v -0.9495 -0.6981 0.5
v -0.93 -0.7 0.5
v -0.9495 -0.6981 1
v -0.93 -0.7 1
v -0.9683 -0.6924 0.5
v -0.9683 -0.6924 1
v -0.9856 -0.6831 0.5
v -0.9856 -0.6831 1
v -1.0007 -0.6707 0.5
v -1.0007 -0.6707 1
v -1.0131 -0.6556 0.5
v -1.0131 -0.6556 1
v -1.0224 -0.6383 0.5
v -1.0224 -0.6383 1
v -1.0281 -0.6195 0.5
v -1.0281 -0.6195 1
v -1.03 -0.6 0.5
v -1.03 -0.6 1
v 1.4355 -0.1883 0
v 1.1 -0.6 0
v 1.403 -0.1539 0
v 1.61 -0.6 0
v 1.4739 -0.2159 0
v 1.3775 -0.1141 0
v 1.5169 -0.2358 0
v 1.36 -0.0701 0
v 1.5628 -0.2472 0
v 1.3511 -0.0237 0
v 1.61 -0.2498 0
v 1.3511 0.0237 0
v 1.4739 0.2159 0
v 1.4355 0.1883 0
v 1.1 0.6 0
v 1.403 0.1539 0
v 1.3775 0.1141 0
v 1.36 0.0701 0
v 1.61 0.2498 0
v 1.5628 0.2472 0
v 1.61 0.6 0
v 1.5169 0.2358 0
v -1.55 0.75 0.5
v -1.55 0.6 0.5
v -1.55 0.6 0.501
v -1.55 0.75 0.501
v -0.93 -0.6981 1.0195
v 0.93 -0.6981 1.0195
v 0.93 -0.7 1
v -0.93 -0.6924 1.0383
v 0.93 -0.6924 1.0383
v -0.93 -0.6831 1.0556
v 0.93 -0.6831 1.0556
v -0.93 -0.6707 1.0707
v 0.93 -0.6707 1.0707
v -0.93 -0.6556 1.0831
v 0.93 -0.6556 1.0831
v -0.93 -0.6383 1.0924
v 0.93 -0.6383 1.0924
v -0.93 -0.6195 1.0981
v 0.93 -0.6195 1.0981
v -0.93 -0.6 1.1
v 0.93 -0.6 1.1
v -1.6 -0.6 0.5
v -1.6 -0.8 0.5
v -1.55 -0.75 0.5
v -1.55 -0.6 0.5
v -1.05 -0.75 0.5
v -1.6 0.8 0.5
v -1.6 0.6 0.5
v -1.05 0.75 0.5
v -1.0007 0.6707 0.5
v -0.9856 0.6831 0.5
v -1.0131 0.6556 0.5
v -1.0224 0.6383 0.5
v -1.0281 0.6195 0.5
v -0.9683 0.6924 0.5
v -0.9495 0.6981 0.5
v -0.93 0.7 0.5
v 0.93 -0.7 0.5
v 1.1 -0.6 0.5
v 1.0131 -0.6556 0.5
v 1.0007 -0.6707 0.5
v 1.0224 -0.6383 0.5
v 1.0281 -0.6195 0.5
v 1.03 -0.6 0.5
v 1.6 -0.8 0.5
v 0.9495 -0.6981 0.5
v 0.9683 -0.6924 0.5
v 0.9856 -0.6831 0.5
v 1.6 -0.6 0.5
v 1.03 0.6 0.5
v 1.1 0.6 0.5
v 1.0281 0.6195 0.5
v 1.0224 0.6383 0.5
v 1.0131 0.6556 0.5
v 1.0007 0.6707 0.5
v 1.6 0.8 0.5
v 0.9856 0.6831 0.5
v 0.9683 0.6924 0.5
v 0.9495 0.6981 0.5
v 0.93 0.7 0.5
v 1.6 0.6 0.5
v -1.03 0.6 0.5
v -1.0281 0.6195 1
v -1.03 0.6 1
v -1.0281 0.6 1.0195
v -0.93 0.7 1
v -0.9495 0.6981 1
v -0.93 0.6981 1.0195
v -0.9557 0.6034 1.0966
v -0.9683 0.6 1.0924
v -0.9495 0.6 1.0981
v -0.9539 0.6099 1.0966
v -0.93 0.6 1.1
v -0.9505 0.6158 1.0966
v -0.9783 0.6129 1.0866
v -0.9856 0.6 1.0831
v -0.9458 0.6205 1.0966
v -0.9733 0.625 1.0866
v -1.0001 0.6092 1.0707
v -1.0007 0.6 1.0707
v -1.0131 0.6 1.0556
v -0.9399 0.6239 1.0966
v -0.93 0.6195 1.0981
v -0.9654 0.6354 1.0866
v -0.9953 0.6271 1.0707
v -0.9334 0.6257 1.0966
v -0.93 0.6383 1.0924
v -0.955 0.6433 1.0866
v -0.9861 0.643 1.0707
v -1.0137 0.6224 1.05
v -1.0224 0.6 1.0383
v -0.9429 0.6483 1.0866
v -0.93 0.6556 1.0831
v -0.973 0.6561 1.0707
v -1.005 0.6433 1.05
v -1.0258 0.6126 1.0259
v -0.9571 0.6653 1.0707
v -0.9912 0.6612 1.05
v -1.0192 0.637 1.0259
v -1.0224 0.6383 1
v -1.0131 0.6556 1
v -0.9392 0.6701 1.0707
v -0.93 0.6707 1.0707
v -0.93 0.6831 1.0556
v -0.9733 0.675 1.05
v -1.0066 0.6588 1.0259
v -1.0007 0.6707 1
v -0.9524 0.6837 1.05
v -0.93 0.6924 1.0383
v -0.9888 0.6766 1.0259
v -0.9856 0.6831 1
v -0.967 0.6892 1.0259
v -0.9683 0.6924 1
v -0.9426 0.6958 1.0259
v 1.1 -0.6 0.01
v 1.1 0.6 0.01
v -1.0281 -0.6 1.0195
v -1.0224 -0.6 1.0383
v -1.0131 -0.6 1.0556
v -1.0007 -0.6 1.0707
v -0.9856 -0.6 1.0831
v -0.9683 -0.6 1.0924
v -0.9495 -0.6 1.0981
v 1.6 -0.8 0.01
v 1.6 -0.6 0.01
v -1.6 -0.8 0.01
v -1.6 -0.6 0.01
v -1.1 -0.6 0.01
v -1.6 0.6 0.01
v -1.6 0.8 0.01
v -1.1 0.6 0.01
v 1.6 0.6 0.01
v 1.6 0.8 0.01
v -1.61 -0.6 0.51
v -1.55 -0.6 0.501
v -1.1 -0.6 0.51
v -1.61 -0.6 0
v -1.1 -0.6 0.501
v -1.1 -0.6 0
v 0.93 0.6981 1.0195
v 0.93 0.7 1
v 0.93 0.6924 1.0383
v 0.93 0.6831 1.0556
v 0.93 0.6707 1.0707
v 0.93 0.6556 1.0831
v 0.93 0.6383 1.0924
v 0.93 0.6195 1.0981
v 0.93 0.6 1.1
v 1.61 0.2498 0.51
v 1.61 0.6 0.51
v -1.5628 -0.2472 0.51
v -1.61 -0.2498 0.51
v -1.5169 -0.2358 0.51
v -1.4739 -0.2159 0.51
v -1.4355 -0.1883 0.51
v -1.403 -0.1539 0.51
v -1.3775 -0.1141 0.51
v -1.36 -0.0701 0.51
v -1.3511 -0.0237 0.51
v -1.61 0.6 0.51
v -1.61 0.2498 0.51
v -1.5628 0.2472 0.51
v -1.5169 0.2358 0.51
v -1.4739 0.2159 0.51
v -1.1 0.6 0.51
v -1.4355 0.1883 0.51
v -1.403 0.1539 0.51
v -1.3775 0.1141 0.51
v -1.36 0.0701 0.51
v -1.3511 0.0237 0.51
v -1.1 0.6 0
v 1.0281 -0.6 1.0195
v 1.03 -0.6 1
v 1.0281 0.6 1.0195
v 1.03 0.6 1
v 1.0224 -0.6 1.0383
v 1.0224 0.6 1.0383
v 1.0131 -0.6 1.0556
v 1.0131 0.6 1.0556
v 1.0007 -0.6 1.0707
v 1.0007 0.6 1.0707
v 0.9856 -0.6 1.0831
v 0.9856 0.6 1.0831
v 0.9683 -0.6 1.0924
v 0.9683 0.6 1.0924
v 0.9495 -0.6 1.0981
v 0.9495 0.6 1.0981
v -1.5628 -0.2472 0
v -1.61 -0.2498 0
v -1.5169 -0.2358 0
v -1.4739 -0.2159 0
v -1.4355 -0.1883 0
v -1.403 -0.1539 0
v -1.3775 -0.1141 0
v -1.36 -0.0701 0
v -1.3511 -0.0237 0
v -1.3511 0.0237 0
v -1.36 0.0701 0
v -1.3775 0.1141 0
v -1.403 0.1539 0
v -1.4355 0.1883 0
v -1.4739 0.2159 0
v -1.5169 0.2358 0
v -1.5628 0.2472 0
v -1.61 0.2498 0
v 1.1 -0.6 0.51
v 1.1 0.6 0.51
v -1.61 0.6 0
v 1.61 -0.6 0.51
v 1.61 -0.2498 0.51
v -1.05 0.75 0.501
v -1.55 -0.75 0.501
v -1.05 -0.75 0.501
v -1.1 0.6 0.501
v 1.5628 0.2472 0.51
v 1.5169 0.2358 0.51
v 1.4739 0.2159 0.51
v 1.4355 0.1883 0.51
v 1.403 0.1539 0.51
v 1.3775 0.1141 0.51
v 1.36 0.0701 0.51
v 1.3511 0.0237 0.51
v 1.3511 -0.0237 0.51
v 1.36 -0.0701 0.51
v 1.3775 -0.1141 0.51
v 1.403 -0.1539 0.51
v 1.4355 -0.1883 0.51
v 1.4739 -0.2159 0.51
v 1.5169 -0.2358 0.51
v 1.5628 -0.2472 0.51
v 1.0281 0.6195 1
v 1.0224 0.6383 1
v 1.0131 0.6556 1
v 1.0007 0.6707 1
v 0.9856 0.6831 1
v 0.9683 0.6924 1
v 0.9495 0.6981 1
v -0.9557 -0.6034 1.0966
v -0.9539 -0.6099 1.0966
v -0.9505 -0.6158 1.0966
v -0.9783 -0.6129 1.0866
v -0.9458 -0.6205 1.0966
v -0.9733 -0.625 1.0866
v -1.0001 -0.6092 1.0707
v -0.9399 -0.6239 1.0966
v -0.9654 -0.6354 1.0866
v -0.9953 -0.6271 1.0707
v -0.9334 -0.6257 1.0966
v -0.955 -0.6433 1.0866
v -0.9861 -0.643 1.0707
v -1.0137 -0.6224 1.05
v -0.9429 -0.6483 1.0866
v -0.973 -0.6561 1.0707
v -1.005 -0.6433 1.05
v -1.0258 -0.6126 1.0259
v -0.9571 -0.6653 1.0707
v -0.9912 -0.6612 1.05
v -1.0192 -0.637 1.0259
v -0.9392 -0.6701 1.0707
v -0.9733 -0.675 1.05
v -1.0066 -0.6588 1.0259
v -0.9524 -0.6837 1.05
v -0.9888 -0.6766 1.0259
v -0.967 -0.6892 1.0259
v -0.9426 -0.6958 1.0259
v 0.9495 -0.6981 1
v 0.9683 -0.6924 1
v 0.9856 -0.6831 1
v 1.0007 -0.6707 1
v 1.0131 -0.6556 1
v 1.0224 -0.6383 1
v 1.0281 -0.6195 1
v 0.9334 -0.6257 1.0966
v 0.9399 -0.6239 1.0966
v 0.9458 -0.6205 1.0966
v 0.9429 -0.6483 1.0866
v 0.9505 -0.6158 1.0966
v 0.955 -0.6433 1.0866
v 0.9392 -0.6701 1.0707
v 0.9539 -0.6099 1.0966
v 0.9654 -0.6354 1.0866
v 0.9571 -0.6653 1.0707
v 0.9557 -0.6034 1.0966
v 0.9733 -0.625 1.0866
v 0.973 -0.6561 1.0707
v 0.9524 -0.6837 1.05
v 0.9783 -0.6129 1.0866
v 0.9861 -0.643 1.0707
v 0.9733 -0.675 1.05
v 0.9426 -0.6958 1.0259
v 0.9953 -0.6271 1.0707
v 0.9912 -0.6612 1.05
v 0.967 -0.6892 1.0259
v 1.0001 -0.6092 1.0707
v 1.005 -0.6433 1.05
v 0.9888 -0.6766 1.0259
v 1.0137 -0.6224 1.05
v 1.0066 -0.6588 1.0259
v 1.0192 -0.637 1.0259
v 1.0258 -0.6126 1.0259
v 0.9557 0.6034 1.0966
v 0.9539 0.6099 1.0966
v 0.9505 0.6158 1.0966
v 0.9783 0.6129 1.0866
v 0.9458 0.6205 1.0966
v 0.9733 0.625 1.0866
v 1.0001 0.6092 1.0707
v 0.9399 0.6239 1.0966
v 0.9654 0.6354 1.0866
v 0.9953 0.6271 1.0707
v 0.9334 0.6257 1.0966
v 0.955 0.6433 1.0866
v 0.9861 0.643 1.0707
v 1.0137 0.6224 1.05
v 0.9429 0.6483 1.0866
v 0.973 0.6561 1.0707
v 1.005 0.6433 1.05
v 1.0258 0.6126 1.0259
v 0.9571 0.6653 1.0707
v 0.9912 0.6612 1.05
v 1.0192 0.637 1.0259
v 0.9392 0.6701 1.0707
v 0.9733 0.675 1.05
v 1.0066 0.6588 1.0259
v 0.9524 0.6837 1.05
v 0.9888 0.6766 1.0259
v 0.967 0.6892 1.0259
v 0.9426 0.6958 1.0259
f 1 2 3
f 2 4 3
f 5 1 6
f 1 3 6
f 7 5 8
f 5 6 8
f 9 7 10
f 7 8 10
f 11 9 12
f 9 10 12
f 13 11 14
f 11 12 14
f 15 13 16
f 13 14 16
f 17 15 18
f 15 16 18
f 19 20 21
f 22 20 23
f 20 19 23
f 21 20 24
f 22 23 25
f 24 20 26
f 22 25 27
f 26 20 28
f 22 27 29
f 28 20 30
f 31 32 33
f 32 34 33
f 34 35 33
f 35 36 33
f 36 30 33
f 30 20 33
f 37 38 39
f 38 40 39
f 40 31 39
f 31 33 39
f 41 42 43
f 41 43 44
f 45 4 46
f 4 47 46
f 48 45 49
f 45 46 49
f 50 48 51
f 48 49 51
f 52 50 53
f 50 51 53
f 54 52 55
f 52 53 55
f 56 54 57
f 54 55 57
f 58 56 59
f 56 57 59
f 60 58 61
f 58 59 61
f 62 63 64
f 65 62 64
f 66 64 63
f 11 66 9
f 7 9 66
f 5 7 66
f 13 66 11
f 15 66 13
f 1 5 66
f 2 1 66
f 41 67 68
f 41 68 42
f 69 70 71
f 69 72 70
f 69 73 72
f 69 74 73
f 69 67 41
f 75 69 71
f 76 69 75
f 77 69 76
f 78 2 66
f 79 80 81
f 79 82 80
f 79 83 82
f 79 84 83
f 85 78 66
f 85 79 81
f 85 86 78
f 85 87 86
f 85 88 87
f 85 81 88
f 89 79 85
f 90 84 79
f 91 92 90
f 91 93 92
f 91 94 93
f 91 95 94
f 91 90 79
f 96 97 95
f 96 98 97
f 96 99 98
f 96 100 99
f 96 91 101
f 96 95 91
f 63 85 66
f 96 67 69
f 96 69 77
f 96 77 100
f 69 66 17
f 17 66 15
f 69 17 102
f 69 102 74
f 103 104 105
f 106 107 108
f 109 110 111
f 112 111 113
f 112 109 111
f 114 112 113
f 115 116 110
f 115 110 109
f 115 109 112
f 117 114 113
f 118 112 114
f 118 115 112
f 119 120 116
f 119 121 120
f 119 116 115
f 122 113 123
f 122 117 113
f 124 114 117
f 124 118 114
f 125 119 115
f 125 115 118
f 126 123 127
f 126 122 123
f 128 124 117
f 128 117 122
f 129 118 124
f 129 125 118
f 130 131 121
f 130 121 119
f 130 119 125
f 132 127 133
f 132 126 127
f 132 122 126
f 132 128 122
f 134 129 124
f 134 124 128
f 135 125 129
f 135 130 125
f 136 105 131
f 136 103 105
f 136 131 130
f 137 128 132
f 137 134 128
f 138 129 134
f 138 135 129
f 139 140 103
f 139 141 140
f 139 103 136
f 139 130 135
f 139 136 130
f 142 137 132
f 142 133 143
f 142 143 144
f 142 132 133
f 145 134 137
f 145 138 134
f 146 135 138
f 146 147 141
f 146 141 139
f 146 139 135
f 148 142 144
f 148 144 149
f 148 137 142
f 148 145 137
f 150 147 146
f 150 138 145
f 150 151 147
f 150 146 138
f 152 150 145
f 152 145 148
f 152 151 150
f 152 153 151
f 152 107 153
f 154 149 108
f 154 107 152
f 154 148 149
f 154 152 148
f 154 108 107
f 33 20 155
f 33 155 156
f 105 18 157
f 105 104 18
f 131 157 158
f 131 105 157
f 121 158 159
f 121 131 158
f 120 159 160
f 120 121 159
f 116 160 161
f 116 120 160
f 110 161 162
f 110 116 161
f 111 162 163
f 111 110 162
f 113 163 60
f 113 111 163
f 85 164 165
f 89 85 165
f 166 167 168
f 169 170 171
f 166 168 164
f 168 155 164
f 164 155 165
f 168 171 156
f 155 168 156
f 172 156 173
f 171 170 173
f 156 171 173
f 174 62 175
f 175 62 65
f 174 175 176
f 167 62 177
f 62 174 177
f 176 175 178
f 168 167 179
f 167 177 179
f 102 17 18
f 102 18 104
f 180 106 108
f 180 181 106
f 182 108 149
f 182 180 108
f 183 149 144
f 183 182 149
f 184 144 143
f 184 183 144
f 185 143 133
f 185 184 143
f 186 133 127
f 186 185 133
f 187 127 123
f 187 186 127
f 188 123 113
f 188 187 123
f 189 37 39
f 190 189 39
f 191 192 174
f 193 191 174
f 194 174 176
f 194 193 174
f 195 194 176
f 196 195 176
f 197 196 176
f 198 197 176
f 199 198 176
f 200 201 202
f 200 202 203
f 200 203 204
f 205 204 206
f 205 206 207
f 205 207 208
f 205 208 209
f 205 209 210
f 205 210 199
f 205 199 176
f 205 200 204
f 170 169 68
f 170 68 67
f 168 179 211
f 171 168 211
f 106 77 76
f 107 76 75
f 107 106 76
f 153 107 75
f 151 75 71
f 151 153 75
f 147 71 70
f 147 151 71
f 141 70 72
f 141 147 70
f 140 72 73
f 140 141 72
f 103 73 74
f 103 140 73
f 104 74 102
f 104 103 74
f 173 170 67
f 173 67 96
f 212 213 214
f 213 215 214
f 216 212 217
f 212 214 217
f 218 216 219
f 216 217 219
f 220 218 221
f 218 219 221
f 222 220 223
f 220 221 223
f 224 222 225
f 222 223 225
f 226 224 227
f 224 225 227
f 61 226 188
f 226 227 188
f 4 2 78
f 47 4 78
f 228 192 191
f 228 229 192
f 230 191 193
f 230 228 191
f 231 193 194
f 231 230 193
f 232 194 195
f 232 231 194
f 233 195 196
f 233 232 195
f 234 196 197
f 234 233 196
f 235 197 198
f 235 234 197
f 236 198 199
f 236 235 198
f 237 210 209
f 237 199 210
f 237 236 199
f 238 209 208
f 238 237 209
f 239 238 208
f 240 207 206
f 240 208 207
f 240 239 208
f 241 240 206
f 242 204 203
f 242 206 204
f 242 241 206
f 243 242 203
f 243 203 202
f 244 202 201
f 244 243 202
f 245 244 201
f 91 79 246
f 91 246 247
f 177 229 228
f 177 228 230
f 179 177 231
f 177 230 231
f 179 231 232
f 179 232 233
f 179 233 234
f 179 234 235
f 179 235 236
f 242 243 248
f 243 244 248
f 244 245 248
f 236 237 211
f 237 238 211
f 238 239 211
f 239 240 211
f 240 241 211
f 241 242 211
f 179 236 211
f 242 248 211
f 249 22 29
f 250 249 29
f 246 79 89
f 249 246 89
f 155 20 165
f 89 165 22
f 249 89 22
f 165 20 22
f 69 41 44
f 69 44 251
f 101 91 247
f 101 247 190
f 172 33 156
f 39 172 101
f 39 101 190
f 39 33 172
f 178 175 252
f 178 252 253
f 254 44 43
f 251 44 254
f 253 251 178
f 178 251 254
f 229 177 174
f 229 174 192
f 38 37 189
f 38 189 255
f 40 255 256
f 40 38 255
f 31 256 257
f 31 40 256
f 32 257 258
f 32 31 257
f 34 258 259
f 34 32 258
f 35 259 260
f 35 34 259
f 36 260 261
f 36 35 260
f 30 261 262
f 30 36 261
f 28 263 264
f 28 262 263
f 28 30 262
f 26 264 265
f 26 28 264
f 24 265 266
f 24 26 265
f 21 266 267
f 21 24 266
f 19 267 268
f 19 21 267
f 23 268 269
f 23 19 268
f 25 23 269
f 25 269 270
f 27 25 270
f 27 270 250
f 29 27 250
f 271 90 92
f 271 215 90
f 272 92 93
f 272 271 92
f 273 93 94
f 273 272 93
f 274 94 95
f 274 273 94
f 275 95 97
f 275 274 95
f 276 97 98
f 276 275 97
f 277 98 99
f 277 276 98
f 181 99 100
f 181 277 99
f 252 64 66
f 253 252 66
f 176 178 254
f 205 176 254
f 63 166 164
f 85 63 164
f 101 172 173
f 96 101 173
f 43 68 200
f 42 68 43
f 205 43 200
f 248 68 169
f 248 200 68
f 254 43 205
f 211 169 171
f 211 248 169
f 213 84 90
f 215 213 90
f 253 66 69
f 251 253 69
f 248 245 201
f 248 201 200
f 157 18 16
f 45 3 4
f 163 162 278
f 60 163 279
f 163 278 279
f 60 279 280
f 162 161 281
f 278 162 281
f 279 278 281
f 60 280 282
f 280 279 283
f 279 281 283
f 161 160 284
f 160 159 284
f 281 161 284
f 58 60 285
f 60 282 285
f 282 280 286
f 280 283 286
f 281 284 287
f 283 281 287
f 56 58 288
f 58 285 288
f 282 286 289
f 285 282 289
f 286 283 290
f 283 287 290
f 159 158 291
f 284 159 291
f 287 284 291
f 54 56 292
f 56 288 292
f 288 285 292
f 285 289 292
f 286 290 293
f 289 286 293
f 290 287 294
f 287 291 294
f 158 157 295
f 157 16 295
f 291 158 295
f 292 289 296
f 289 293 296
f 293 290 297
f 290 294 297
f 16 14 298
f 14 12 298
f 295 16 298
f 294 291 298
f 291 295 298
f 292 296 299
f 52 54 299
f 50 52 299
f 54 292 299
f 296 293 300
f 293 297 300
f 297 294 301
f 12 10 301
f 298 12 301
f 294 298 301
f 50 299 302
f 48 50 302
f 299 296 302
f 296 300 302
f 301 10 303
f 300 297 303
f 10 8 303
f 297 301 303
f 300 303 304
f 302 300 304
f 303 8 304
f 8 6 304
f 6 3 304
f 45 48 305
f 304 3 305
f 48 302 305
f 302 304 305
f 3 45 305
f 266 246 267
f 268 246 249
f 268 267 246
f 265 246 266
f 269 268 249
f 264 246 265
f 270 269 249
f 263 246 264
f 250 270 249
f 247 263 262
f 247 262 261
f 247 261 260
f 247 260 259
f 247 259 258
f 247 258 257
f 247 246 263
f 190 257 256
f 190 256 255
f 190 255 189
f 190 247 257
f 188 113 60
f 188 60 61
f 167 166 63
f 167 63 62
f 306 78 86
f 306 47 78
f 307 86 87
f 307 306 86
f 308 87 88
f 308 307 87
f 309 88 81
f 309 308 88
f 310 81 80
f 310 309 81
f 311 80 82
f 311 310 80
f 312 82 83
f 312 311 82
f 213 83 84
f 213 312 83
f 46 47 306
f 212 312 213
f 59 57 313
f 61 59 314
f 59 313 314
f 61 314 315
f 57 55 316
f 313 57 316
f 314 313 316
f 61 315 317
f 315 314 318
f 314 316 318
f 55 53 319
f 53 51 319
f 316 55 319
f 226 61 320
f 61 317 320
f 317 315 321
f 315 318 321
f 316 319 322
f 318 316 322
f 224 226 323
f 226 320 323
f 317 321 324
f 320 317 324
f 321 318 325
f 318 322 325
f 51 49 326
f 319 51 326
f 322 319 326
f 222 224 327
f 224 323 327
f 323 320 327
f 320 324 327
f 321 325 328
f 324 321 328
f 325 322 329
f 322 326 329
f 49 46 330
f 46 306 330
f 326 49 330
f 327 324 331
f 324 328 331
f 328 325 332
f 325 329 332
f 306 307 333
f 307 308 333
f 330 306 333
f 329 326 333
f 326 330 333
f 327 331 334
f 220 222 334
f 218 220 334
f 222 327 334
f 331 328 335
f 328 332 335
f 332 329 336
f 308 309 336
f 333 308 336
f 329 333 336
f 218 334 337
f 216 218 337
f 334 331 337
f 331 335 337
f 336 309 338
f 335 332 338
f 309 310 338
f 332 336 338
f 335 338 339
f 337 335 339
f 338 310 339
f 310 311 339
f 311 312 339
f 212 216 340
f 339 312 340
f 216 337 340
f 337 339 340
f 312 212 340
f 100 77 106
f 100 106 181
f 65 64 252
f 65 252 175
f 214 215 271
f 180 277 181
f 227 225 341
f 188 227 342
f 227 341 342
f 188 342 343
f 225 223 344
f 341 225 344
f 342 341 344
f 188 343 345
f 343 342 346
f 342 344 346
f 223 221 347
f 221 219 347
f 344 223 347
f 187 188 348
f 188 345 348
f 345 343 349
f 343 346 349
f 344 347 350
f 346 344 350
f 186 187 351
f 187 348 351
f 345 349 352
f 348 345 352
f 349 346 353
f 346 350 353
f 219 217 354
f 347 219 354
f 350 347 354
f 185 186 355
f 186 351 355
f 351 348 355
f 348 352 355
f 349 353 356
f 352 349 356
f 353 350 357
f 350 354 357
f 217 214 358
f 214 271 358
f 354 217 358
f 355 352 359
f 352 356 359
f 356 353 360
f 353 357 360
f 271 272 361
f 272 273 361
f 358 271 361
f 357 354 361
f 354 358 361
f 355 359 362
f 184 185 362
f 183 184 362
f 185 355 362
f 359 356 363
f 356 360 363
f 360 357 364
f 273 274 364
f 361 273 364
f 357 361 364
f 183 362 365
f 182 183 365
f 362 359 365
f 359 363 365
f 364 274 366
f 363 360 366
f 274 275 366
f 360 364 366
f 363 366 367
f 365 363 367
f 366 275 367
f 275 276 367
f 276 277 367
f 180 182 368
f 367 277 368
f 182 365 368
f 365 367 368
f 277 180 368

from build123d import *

# Parameters (mm, degrees)
EXTRUDE_START       = 0.01
SKETCH_2_W          = 3.2
SKETCH_2_H          = 1.6
EXTRUDE_1_DEPTH     = 0.49
SKETCH_3_W          = 0.51
SKETCH_3_H          = 1.2
EXTRUDE_2_DEPTH     = 0.51
EXTRUDE_START_2     = 0.5
SKETCH_4_W          = 2.06
SKETCH_4_H          = 1.4
EXTRUDE_3_DEPTH     = 0.6
FILLET_1_R          = 0.1
SKETCH_5_W          = 0.5
SKETCH_5_H          = 1.5
EXTRUDE_4_DEPTH     = 0.001
SKETCH_6_R          = 0.25
CUT_EXTRUDE_2_DEPTH = 0.52


with BuildPart() as part:
    # Эскиз2 → Бобышка-Вытянуть1 (new body)
    with BuildSketch(Plane.XY.offset(EXTRUDE_START)):
        Rectangle(SKETCH_2_W, SKETCH_2_H)
    extrude(amount=EXTRUDE_1_DEPTH)

    # Эскиз3 → Бобышка-Вытянуть2 (add)
    with BuildSketch(Plane.XY):
        with Locations((-1.355, 0)):
            Rectangle(SKETCH_3_W, SKETCH_3_H)
        with Locations((1.355, 0)):
            Rectangle(SKETCH_3_W, SKETCH_3_H)
    extrude(amount=EXTRUDE_2_DEPTH)

    # Эскиз4 → Бобышка-Вытянуть3 (add)
    with BuildSketch(Plane.XY.offset(EXTRUDE_START_2)):
        Rectangle(SKETCH_4_W, SKETCH_4_H)
    extrude(amount=EXTRUDE_3_DEPTH)

    # Скругление1
    fillet_1_edges = [part.edges().sort_by_distance(p)[0] for p in [
        (-1.03, 0.7, 0.8),
        (-1.03, -0.7, 0.8),
        (1.03, -0.7, 0.8),
        (1.03, 0.7, 0.8),
        (-1.03, 0, 1.1),
        (0, -0.7, 1.1),
        (1.03, 0, 1.1),
        (0, 0.7, 1.1),
    ]]
    fillet(fillet_1_edges, radius=FILLET_1_R)

    # Эскиз5 → Бобышка-Вытянуть4 (add)
    with BuildSketch(Plane.XY.offset(0.5)):
        with Locations((-1.3, 0)):
            Rectangle(SKETCH_5_W, SKETCH_5_H)
    extrude(amount=EXTRUDE_4_DEPTH)

    # Эскиз6 → Вырез-Вытянуть2 (cut)
    with BuildSketch(Plane.XY):
        with Locations((-1.6, 0)):
            Circle(SKETCH_6_R)
        with Locations((1.6, 0)):
            Circle(SKETCH_6_R)
    extrude(amount=CUT_EXTRUDE_2_DEPTH, mode=Mode.SUBTRACT)


solid = part.part
